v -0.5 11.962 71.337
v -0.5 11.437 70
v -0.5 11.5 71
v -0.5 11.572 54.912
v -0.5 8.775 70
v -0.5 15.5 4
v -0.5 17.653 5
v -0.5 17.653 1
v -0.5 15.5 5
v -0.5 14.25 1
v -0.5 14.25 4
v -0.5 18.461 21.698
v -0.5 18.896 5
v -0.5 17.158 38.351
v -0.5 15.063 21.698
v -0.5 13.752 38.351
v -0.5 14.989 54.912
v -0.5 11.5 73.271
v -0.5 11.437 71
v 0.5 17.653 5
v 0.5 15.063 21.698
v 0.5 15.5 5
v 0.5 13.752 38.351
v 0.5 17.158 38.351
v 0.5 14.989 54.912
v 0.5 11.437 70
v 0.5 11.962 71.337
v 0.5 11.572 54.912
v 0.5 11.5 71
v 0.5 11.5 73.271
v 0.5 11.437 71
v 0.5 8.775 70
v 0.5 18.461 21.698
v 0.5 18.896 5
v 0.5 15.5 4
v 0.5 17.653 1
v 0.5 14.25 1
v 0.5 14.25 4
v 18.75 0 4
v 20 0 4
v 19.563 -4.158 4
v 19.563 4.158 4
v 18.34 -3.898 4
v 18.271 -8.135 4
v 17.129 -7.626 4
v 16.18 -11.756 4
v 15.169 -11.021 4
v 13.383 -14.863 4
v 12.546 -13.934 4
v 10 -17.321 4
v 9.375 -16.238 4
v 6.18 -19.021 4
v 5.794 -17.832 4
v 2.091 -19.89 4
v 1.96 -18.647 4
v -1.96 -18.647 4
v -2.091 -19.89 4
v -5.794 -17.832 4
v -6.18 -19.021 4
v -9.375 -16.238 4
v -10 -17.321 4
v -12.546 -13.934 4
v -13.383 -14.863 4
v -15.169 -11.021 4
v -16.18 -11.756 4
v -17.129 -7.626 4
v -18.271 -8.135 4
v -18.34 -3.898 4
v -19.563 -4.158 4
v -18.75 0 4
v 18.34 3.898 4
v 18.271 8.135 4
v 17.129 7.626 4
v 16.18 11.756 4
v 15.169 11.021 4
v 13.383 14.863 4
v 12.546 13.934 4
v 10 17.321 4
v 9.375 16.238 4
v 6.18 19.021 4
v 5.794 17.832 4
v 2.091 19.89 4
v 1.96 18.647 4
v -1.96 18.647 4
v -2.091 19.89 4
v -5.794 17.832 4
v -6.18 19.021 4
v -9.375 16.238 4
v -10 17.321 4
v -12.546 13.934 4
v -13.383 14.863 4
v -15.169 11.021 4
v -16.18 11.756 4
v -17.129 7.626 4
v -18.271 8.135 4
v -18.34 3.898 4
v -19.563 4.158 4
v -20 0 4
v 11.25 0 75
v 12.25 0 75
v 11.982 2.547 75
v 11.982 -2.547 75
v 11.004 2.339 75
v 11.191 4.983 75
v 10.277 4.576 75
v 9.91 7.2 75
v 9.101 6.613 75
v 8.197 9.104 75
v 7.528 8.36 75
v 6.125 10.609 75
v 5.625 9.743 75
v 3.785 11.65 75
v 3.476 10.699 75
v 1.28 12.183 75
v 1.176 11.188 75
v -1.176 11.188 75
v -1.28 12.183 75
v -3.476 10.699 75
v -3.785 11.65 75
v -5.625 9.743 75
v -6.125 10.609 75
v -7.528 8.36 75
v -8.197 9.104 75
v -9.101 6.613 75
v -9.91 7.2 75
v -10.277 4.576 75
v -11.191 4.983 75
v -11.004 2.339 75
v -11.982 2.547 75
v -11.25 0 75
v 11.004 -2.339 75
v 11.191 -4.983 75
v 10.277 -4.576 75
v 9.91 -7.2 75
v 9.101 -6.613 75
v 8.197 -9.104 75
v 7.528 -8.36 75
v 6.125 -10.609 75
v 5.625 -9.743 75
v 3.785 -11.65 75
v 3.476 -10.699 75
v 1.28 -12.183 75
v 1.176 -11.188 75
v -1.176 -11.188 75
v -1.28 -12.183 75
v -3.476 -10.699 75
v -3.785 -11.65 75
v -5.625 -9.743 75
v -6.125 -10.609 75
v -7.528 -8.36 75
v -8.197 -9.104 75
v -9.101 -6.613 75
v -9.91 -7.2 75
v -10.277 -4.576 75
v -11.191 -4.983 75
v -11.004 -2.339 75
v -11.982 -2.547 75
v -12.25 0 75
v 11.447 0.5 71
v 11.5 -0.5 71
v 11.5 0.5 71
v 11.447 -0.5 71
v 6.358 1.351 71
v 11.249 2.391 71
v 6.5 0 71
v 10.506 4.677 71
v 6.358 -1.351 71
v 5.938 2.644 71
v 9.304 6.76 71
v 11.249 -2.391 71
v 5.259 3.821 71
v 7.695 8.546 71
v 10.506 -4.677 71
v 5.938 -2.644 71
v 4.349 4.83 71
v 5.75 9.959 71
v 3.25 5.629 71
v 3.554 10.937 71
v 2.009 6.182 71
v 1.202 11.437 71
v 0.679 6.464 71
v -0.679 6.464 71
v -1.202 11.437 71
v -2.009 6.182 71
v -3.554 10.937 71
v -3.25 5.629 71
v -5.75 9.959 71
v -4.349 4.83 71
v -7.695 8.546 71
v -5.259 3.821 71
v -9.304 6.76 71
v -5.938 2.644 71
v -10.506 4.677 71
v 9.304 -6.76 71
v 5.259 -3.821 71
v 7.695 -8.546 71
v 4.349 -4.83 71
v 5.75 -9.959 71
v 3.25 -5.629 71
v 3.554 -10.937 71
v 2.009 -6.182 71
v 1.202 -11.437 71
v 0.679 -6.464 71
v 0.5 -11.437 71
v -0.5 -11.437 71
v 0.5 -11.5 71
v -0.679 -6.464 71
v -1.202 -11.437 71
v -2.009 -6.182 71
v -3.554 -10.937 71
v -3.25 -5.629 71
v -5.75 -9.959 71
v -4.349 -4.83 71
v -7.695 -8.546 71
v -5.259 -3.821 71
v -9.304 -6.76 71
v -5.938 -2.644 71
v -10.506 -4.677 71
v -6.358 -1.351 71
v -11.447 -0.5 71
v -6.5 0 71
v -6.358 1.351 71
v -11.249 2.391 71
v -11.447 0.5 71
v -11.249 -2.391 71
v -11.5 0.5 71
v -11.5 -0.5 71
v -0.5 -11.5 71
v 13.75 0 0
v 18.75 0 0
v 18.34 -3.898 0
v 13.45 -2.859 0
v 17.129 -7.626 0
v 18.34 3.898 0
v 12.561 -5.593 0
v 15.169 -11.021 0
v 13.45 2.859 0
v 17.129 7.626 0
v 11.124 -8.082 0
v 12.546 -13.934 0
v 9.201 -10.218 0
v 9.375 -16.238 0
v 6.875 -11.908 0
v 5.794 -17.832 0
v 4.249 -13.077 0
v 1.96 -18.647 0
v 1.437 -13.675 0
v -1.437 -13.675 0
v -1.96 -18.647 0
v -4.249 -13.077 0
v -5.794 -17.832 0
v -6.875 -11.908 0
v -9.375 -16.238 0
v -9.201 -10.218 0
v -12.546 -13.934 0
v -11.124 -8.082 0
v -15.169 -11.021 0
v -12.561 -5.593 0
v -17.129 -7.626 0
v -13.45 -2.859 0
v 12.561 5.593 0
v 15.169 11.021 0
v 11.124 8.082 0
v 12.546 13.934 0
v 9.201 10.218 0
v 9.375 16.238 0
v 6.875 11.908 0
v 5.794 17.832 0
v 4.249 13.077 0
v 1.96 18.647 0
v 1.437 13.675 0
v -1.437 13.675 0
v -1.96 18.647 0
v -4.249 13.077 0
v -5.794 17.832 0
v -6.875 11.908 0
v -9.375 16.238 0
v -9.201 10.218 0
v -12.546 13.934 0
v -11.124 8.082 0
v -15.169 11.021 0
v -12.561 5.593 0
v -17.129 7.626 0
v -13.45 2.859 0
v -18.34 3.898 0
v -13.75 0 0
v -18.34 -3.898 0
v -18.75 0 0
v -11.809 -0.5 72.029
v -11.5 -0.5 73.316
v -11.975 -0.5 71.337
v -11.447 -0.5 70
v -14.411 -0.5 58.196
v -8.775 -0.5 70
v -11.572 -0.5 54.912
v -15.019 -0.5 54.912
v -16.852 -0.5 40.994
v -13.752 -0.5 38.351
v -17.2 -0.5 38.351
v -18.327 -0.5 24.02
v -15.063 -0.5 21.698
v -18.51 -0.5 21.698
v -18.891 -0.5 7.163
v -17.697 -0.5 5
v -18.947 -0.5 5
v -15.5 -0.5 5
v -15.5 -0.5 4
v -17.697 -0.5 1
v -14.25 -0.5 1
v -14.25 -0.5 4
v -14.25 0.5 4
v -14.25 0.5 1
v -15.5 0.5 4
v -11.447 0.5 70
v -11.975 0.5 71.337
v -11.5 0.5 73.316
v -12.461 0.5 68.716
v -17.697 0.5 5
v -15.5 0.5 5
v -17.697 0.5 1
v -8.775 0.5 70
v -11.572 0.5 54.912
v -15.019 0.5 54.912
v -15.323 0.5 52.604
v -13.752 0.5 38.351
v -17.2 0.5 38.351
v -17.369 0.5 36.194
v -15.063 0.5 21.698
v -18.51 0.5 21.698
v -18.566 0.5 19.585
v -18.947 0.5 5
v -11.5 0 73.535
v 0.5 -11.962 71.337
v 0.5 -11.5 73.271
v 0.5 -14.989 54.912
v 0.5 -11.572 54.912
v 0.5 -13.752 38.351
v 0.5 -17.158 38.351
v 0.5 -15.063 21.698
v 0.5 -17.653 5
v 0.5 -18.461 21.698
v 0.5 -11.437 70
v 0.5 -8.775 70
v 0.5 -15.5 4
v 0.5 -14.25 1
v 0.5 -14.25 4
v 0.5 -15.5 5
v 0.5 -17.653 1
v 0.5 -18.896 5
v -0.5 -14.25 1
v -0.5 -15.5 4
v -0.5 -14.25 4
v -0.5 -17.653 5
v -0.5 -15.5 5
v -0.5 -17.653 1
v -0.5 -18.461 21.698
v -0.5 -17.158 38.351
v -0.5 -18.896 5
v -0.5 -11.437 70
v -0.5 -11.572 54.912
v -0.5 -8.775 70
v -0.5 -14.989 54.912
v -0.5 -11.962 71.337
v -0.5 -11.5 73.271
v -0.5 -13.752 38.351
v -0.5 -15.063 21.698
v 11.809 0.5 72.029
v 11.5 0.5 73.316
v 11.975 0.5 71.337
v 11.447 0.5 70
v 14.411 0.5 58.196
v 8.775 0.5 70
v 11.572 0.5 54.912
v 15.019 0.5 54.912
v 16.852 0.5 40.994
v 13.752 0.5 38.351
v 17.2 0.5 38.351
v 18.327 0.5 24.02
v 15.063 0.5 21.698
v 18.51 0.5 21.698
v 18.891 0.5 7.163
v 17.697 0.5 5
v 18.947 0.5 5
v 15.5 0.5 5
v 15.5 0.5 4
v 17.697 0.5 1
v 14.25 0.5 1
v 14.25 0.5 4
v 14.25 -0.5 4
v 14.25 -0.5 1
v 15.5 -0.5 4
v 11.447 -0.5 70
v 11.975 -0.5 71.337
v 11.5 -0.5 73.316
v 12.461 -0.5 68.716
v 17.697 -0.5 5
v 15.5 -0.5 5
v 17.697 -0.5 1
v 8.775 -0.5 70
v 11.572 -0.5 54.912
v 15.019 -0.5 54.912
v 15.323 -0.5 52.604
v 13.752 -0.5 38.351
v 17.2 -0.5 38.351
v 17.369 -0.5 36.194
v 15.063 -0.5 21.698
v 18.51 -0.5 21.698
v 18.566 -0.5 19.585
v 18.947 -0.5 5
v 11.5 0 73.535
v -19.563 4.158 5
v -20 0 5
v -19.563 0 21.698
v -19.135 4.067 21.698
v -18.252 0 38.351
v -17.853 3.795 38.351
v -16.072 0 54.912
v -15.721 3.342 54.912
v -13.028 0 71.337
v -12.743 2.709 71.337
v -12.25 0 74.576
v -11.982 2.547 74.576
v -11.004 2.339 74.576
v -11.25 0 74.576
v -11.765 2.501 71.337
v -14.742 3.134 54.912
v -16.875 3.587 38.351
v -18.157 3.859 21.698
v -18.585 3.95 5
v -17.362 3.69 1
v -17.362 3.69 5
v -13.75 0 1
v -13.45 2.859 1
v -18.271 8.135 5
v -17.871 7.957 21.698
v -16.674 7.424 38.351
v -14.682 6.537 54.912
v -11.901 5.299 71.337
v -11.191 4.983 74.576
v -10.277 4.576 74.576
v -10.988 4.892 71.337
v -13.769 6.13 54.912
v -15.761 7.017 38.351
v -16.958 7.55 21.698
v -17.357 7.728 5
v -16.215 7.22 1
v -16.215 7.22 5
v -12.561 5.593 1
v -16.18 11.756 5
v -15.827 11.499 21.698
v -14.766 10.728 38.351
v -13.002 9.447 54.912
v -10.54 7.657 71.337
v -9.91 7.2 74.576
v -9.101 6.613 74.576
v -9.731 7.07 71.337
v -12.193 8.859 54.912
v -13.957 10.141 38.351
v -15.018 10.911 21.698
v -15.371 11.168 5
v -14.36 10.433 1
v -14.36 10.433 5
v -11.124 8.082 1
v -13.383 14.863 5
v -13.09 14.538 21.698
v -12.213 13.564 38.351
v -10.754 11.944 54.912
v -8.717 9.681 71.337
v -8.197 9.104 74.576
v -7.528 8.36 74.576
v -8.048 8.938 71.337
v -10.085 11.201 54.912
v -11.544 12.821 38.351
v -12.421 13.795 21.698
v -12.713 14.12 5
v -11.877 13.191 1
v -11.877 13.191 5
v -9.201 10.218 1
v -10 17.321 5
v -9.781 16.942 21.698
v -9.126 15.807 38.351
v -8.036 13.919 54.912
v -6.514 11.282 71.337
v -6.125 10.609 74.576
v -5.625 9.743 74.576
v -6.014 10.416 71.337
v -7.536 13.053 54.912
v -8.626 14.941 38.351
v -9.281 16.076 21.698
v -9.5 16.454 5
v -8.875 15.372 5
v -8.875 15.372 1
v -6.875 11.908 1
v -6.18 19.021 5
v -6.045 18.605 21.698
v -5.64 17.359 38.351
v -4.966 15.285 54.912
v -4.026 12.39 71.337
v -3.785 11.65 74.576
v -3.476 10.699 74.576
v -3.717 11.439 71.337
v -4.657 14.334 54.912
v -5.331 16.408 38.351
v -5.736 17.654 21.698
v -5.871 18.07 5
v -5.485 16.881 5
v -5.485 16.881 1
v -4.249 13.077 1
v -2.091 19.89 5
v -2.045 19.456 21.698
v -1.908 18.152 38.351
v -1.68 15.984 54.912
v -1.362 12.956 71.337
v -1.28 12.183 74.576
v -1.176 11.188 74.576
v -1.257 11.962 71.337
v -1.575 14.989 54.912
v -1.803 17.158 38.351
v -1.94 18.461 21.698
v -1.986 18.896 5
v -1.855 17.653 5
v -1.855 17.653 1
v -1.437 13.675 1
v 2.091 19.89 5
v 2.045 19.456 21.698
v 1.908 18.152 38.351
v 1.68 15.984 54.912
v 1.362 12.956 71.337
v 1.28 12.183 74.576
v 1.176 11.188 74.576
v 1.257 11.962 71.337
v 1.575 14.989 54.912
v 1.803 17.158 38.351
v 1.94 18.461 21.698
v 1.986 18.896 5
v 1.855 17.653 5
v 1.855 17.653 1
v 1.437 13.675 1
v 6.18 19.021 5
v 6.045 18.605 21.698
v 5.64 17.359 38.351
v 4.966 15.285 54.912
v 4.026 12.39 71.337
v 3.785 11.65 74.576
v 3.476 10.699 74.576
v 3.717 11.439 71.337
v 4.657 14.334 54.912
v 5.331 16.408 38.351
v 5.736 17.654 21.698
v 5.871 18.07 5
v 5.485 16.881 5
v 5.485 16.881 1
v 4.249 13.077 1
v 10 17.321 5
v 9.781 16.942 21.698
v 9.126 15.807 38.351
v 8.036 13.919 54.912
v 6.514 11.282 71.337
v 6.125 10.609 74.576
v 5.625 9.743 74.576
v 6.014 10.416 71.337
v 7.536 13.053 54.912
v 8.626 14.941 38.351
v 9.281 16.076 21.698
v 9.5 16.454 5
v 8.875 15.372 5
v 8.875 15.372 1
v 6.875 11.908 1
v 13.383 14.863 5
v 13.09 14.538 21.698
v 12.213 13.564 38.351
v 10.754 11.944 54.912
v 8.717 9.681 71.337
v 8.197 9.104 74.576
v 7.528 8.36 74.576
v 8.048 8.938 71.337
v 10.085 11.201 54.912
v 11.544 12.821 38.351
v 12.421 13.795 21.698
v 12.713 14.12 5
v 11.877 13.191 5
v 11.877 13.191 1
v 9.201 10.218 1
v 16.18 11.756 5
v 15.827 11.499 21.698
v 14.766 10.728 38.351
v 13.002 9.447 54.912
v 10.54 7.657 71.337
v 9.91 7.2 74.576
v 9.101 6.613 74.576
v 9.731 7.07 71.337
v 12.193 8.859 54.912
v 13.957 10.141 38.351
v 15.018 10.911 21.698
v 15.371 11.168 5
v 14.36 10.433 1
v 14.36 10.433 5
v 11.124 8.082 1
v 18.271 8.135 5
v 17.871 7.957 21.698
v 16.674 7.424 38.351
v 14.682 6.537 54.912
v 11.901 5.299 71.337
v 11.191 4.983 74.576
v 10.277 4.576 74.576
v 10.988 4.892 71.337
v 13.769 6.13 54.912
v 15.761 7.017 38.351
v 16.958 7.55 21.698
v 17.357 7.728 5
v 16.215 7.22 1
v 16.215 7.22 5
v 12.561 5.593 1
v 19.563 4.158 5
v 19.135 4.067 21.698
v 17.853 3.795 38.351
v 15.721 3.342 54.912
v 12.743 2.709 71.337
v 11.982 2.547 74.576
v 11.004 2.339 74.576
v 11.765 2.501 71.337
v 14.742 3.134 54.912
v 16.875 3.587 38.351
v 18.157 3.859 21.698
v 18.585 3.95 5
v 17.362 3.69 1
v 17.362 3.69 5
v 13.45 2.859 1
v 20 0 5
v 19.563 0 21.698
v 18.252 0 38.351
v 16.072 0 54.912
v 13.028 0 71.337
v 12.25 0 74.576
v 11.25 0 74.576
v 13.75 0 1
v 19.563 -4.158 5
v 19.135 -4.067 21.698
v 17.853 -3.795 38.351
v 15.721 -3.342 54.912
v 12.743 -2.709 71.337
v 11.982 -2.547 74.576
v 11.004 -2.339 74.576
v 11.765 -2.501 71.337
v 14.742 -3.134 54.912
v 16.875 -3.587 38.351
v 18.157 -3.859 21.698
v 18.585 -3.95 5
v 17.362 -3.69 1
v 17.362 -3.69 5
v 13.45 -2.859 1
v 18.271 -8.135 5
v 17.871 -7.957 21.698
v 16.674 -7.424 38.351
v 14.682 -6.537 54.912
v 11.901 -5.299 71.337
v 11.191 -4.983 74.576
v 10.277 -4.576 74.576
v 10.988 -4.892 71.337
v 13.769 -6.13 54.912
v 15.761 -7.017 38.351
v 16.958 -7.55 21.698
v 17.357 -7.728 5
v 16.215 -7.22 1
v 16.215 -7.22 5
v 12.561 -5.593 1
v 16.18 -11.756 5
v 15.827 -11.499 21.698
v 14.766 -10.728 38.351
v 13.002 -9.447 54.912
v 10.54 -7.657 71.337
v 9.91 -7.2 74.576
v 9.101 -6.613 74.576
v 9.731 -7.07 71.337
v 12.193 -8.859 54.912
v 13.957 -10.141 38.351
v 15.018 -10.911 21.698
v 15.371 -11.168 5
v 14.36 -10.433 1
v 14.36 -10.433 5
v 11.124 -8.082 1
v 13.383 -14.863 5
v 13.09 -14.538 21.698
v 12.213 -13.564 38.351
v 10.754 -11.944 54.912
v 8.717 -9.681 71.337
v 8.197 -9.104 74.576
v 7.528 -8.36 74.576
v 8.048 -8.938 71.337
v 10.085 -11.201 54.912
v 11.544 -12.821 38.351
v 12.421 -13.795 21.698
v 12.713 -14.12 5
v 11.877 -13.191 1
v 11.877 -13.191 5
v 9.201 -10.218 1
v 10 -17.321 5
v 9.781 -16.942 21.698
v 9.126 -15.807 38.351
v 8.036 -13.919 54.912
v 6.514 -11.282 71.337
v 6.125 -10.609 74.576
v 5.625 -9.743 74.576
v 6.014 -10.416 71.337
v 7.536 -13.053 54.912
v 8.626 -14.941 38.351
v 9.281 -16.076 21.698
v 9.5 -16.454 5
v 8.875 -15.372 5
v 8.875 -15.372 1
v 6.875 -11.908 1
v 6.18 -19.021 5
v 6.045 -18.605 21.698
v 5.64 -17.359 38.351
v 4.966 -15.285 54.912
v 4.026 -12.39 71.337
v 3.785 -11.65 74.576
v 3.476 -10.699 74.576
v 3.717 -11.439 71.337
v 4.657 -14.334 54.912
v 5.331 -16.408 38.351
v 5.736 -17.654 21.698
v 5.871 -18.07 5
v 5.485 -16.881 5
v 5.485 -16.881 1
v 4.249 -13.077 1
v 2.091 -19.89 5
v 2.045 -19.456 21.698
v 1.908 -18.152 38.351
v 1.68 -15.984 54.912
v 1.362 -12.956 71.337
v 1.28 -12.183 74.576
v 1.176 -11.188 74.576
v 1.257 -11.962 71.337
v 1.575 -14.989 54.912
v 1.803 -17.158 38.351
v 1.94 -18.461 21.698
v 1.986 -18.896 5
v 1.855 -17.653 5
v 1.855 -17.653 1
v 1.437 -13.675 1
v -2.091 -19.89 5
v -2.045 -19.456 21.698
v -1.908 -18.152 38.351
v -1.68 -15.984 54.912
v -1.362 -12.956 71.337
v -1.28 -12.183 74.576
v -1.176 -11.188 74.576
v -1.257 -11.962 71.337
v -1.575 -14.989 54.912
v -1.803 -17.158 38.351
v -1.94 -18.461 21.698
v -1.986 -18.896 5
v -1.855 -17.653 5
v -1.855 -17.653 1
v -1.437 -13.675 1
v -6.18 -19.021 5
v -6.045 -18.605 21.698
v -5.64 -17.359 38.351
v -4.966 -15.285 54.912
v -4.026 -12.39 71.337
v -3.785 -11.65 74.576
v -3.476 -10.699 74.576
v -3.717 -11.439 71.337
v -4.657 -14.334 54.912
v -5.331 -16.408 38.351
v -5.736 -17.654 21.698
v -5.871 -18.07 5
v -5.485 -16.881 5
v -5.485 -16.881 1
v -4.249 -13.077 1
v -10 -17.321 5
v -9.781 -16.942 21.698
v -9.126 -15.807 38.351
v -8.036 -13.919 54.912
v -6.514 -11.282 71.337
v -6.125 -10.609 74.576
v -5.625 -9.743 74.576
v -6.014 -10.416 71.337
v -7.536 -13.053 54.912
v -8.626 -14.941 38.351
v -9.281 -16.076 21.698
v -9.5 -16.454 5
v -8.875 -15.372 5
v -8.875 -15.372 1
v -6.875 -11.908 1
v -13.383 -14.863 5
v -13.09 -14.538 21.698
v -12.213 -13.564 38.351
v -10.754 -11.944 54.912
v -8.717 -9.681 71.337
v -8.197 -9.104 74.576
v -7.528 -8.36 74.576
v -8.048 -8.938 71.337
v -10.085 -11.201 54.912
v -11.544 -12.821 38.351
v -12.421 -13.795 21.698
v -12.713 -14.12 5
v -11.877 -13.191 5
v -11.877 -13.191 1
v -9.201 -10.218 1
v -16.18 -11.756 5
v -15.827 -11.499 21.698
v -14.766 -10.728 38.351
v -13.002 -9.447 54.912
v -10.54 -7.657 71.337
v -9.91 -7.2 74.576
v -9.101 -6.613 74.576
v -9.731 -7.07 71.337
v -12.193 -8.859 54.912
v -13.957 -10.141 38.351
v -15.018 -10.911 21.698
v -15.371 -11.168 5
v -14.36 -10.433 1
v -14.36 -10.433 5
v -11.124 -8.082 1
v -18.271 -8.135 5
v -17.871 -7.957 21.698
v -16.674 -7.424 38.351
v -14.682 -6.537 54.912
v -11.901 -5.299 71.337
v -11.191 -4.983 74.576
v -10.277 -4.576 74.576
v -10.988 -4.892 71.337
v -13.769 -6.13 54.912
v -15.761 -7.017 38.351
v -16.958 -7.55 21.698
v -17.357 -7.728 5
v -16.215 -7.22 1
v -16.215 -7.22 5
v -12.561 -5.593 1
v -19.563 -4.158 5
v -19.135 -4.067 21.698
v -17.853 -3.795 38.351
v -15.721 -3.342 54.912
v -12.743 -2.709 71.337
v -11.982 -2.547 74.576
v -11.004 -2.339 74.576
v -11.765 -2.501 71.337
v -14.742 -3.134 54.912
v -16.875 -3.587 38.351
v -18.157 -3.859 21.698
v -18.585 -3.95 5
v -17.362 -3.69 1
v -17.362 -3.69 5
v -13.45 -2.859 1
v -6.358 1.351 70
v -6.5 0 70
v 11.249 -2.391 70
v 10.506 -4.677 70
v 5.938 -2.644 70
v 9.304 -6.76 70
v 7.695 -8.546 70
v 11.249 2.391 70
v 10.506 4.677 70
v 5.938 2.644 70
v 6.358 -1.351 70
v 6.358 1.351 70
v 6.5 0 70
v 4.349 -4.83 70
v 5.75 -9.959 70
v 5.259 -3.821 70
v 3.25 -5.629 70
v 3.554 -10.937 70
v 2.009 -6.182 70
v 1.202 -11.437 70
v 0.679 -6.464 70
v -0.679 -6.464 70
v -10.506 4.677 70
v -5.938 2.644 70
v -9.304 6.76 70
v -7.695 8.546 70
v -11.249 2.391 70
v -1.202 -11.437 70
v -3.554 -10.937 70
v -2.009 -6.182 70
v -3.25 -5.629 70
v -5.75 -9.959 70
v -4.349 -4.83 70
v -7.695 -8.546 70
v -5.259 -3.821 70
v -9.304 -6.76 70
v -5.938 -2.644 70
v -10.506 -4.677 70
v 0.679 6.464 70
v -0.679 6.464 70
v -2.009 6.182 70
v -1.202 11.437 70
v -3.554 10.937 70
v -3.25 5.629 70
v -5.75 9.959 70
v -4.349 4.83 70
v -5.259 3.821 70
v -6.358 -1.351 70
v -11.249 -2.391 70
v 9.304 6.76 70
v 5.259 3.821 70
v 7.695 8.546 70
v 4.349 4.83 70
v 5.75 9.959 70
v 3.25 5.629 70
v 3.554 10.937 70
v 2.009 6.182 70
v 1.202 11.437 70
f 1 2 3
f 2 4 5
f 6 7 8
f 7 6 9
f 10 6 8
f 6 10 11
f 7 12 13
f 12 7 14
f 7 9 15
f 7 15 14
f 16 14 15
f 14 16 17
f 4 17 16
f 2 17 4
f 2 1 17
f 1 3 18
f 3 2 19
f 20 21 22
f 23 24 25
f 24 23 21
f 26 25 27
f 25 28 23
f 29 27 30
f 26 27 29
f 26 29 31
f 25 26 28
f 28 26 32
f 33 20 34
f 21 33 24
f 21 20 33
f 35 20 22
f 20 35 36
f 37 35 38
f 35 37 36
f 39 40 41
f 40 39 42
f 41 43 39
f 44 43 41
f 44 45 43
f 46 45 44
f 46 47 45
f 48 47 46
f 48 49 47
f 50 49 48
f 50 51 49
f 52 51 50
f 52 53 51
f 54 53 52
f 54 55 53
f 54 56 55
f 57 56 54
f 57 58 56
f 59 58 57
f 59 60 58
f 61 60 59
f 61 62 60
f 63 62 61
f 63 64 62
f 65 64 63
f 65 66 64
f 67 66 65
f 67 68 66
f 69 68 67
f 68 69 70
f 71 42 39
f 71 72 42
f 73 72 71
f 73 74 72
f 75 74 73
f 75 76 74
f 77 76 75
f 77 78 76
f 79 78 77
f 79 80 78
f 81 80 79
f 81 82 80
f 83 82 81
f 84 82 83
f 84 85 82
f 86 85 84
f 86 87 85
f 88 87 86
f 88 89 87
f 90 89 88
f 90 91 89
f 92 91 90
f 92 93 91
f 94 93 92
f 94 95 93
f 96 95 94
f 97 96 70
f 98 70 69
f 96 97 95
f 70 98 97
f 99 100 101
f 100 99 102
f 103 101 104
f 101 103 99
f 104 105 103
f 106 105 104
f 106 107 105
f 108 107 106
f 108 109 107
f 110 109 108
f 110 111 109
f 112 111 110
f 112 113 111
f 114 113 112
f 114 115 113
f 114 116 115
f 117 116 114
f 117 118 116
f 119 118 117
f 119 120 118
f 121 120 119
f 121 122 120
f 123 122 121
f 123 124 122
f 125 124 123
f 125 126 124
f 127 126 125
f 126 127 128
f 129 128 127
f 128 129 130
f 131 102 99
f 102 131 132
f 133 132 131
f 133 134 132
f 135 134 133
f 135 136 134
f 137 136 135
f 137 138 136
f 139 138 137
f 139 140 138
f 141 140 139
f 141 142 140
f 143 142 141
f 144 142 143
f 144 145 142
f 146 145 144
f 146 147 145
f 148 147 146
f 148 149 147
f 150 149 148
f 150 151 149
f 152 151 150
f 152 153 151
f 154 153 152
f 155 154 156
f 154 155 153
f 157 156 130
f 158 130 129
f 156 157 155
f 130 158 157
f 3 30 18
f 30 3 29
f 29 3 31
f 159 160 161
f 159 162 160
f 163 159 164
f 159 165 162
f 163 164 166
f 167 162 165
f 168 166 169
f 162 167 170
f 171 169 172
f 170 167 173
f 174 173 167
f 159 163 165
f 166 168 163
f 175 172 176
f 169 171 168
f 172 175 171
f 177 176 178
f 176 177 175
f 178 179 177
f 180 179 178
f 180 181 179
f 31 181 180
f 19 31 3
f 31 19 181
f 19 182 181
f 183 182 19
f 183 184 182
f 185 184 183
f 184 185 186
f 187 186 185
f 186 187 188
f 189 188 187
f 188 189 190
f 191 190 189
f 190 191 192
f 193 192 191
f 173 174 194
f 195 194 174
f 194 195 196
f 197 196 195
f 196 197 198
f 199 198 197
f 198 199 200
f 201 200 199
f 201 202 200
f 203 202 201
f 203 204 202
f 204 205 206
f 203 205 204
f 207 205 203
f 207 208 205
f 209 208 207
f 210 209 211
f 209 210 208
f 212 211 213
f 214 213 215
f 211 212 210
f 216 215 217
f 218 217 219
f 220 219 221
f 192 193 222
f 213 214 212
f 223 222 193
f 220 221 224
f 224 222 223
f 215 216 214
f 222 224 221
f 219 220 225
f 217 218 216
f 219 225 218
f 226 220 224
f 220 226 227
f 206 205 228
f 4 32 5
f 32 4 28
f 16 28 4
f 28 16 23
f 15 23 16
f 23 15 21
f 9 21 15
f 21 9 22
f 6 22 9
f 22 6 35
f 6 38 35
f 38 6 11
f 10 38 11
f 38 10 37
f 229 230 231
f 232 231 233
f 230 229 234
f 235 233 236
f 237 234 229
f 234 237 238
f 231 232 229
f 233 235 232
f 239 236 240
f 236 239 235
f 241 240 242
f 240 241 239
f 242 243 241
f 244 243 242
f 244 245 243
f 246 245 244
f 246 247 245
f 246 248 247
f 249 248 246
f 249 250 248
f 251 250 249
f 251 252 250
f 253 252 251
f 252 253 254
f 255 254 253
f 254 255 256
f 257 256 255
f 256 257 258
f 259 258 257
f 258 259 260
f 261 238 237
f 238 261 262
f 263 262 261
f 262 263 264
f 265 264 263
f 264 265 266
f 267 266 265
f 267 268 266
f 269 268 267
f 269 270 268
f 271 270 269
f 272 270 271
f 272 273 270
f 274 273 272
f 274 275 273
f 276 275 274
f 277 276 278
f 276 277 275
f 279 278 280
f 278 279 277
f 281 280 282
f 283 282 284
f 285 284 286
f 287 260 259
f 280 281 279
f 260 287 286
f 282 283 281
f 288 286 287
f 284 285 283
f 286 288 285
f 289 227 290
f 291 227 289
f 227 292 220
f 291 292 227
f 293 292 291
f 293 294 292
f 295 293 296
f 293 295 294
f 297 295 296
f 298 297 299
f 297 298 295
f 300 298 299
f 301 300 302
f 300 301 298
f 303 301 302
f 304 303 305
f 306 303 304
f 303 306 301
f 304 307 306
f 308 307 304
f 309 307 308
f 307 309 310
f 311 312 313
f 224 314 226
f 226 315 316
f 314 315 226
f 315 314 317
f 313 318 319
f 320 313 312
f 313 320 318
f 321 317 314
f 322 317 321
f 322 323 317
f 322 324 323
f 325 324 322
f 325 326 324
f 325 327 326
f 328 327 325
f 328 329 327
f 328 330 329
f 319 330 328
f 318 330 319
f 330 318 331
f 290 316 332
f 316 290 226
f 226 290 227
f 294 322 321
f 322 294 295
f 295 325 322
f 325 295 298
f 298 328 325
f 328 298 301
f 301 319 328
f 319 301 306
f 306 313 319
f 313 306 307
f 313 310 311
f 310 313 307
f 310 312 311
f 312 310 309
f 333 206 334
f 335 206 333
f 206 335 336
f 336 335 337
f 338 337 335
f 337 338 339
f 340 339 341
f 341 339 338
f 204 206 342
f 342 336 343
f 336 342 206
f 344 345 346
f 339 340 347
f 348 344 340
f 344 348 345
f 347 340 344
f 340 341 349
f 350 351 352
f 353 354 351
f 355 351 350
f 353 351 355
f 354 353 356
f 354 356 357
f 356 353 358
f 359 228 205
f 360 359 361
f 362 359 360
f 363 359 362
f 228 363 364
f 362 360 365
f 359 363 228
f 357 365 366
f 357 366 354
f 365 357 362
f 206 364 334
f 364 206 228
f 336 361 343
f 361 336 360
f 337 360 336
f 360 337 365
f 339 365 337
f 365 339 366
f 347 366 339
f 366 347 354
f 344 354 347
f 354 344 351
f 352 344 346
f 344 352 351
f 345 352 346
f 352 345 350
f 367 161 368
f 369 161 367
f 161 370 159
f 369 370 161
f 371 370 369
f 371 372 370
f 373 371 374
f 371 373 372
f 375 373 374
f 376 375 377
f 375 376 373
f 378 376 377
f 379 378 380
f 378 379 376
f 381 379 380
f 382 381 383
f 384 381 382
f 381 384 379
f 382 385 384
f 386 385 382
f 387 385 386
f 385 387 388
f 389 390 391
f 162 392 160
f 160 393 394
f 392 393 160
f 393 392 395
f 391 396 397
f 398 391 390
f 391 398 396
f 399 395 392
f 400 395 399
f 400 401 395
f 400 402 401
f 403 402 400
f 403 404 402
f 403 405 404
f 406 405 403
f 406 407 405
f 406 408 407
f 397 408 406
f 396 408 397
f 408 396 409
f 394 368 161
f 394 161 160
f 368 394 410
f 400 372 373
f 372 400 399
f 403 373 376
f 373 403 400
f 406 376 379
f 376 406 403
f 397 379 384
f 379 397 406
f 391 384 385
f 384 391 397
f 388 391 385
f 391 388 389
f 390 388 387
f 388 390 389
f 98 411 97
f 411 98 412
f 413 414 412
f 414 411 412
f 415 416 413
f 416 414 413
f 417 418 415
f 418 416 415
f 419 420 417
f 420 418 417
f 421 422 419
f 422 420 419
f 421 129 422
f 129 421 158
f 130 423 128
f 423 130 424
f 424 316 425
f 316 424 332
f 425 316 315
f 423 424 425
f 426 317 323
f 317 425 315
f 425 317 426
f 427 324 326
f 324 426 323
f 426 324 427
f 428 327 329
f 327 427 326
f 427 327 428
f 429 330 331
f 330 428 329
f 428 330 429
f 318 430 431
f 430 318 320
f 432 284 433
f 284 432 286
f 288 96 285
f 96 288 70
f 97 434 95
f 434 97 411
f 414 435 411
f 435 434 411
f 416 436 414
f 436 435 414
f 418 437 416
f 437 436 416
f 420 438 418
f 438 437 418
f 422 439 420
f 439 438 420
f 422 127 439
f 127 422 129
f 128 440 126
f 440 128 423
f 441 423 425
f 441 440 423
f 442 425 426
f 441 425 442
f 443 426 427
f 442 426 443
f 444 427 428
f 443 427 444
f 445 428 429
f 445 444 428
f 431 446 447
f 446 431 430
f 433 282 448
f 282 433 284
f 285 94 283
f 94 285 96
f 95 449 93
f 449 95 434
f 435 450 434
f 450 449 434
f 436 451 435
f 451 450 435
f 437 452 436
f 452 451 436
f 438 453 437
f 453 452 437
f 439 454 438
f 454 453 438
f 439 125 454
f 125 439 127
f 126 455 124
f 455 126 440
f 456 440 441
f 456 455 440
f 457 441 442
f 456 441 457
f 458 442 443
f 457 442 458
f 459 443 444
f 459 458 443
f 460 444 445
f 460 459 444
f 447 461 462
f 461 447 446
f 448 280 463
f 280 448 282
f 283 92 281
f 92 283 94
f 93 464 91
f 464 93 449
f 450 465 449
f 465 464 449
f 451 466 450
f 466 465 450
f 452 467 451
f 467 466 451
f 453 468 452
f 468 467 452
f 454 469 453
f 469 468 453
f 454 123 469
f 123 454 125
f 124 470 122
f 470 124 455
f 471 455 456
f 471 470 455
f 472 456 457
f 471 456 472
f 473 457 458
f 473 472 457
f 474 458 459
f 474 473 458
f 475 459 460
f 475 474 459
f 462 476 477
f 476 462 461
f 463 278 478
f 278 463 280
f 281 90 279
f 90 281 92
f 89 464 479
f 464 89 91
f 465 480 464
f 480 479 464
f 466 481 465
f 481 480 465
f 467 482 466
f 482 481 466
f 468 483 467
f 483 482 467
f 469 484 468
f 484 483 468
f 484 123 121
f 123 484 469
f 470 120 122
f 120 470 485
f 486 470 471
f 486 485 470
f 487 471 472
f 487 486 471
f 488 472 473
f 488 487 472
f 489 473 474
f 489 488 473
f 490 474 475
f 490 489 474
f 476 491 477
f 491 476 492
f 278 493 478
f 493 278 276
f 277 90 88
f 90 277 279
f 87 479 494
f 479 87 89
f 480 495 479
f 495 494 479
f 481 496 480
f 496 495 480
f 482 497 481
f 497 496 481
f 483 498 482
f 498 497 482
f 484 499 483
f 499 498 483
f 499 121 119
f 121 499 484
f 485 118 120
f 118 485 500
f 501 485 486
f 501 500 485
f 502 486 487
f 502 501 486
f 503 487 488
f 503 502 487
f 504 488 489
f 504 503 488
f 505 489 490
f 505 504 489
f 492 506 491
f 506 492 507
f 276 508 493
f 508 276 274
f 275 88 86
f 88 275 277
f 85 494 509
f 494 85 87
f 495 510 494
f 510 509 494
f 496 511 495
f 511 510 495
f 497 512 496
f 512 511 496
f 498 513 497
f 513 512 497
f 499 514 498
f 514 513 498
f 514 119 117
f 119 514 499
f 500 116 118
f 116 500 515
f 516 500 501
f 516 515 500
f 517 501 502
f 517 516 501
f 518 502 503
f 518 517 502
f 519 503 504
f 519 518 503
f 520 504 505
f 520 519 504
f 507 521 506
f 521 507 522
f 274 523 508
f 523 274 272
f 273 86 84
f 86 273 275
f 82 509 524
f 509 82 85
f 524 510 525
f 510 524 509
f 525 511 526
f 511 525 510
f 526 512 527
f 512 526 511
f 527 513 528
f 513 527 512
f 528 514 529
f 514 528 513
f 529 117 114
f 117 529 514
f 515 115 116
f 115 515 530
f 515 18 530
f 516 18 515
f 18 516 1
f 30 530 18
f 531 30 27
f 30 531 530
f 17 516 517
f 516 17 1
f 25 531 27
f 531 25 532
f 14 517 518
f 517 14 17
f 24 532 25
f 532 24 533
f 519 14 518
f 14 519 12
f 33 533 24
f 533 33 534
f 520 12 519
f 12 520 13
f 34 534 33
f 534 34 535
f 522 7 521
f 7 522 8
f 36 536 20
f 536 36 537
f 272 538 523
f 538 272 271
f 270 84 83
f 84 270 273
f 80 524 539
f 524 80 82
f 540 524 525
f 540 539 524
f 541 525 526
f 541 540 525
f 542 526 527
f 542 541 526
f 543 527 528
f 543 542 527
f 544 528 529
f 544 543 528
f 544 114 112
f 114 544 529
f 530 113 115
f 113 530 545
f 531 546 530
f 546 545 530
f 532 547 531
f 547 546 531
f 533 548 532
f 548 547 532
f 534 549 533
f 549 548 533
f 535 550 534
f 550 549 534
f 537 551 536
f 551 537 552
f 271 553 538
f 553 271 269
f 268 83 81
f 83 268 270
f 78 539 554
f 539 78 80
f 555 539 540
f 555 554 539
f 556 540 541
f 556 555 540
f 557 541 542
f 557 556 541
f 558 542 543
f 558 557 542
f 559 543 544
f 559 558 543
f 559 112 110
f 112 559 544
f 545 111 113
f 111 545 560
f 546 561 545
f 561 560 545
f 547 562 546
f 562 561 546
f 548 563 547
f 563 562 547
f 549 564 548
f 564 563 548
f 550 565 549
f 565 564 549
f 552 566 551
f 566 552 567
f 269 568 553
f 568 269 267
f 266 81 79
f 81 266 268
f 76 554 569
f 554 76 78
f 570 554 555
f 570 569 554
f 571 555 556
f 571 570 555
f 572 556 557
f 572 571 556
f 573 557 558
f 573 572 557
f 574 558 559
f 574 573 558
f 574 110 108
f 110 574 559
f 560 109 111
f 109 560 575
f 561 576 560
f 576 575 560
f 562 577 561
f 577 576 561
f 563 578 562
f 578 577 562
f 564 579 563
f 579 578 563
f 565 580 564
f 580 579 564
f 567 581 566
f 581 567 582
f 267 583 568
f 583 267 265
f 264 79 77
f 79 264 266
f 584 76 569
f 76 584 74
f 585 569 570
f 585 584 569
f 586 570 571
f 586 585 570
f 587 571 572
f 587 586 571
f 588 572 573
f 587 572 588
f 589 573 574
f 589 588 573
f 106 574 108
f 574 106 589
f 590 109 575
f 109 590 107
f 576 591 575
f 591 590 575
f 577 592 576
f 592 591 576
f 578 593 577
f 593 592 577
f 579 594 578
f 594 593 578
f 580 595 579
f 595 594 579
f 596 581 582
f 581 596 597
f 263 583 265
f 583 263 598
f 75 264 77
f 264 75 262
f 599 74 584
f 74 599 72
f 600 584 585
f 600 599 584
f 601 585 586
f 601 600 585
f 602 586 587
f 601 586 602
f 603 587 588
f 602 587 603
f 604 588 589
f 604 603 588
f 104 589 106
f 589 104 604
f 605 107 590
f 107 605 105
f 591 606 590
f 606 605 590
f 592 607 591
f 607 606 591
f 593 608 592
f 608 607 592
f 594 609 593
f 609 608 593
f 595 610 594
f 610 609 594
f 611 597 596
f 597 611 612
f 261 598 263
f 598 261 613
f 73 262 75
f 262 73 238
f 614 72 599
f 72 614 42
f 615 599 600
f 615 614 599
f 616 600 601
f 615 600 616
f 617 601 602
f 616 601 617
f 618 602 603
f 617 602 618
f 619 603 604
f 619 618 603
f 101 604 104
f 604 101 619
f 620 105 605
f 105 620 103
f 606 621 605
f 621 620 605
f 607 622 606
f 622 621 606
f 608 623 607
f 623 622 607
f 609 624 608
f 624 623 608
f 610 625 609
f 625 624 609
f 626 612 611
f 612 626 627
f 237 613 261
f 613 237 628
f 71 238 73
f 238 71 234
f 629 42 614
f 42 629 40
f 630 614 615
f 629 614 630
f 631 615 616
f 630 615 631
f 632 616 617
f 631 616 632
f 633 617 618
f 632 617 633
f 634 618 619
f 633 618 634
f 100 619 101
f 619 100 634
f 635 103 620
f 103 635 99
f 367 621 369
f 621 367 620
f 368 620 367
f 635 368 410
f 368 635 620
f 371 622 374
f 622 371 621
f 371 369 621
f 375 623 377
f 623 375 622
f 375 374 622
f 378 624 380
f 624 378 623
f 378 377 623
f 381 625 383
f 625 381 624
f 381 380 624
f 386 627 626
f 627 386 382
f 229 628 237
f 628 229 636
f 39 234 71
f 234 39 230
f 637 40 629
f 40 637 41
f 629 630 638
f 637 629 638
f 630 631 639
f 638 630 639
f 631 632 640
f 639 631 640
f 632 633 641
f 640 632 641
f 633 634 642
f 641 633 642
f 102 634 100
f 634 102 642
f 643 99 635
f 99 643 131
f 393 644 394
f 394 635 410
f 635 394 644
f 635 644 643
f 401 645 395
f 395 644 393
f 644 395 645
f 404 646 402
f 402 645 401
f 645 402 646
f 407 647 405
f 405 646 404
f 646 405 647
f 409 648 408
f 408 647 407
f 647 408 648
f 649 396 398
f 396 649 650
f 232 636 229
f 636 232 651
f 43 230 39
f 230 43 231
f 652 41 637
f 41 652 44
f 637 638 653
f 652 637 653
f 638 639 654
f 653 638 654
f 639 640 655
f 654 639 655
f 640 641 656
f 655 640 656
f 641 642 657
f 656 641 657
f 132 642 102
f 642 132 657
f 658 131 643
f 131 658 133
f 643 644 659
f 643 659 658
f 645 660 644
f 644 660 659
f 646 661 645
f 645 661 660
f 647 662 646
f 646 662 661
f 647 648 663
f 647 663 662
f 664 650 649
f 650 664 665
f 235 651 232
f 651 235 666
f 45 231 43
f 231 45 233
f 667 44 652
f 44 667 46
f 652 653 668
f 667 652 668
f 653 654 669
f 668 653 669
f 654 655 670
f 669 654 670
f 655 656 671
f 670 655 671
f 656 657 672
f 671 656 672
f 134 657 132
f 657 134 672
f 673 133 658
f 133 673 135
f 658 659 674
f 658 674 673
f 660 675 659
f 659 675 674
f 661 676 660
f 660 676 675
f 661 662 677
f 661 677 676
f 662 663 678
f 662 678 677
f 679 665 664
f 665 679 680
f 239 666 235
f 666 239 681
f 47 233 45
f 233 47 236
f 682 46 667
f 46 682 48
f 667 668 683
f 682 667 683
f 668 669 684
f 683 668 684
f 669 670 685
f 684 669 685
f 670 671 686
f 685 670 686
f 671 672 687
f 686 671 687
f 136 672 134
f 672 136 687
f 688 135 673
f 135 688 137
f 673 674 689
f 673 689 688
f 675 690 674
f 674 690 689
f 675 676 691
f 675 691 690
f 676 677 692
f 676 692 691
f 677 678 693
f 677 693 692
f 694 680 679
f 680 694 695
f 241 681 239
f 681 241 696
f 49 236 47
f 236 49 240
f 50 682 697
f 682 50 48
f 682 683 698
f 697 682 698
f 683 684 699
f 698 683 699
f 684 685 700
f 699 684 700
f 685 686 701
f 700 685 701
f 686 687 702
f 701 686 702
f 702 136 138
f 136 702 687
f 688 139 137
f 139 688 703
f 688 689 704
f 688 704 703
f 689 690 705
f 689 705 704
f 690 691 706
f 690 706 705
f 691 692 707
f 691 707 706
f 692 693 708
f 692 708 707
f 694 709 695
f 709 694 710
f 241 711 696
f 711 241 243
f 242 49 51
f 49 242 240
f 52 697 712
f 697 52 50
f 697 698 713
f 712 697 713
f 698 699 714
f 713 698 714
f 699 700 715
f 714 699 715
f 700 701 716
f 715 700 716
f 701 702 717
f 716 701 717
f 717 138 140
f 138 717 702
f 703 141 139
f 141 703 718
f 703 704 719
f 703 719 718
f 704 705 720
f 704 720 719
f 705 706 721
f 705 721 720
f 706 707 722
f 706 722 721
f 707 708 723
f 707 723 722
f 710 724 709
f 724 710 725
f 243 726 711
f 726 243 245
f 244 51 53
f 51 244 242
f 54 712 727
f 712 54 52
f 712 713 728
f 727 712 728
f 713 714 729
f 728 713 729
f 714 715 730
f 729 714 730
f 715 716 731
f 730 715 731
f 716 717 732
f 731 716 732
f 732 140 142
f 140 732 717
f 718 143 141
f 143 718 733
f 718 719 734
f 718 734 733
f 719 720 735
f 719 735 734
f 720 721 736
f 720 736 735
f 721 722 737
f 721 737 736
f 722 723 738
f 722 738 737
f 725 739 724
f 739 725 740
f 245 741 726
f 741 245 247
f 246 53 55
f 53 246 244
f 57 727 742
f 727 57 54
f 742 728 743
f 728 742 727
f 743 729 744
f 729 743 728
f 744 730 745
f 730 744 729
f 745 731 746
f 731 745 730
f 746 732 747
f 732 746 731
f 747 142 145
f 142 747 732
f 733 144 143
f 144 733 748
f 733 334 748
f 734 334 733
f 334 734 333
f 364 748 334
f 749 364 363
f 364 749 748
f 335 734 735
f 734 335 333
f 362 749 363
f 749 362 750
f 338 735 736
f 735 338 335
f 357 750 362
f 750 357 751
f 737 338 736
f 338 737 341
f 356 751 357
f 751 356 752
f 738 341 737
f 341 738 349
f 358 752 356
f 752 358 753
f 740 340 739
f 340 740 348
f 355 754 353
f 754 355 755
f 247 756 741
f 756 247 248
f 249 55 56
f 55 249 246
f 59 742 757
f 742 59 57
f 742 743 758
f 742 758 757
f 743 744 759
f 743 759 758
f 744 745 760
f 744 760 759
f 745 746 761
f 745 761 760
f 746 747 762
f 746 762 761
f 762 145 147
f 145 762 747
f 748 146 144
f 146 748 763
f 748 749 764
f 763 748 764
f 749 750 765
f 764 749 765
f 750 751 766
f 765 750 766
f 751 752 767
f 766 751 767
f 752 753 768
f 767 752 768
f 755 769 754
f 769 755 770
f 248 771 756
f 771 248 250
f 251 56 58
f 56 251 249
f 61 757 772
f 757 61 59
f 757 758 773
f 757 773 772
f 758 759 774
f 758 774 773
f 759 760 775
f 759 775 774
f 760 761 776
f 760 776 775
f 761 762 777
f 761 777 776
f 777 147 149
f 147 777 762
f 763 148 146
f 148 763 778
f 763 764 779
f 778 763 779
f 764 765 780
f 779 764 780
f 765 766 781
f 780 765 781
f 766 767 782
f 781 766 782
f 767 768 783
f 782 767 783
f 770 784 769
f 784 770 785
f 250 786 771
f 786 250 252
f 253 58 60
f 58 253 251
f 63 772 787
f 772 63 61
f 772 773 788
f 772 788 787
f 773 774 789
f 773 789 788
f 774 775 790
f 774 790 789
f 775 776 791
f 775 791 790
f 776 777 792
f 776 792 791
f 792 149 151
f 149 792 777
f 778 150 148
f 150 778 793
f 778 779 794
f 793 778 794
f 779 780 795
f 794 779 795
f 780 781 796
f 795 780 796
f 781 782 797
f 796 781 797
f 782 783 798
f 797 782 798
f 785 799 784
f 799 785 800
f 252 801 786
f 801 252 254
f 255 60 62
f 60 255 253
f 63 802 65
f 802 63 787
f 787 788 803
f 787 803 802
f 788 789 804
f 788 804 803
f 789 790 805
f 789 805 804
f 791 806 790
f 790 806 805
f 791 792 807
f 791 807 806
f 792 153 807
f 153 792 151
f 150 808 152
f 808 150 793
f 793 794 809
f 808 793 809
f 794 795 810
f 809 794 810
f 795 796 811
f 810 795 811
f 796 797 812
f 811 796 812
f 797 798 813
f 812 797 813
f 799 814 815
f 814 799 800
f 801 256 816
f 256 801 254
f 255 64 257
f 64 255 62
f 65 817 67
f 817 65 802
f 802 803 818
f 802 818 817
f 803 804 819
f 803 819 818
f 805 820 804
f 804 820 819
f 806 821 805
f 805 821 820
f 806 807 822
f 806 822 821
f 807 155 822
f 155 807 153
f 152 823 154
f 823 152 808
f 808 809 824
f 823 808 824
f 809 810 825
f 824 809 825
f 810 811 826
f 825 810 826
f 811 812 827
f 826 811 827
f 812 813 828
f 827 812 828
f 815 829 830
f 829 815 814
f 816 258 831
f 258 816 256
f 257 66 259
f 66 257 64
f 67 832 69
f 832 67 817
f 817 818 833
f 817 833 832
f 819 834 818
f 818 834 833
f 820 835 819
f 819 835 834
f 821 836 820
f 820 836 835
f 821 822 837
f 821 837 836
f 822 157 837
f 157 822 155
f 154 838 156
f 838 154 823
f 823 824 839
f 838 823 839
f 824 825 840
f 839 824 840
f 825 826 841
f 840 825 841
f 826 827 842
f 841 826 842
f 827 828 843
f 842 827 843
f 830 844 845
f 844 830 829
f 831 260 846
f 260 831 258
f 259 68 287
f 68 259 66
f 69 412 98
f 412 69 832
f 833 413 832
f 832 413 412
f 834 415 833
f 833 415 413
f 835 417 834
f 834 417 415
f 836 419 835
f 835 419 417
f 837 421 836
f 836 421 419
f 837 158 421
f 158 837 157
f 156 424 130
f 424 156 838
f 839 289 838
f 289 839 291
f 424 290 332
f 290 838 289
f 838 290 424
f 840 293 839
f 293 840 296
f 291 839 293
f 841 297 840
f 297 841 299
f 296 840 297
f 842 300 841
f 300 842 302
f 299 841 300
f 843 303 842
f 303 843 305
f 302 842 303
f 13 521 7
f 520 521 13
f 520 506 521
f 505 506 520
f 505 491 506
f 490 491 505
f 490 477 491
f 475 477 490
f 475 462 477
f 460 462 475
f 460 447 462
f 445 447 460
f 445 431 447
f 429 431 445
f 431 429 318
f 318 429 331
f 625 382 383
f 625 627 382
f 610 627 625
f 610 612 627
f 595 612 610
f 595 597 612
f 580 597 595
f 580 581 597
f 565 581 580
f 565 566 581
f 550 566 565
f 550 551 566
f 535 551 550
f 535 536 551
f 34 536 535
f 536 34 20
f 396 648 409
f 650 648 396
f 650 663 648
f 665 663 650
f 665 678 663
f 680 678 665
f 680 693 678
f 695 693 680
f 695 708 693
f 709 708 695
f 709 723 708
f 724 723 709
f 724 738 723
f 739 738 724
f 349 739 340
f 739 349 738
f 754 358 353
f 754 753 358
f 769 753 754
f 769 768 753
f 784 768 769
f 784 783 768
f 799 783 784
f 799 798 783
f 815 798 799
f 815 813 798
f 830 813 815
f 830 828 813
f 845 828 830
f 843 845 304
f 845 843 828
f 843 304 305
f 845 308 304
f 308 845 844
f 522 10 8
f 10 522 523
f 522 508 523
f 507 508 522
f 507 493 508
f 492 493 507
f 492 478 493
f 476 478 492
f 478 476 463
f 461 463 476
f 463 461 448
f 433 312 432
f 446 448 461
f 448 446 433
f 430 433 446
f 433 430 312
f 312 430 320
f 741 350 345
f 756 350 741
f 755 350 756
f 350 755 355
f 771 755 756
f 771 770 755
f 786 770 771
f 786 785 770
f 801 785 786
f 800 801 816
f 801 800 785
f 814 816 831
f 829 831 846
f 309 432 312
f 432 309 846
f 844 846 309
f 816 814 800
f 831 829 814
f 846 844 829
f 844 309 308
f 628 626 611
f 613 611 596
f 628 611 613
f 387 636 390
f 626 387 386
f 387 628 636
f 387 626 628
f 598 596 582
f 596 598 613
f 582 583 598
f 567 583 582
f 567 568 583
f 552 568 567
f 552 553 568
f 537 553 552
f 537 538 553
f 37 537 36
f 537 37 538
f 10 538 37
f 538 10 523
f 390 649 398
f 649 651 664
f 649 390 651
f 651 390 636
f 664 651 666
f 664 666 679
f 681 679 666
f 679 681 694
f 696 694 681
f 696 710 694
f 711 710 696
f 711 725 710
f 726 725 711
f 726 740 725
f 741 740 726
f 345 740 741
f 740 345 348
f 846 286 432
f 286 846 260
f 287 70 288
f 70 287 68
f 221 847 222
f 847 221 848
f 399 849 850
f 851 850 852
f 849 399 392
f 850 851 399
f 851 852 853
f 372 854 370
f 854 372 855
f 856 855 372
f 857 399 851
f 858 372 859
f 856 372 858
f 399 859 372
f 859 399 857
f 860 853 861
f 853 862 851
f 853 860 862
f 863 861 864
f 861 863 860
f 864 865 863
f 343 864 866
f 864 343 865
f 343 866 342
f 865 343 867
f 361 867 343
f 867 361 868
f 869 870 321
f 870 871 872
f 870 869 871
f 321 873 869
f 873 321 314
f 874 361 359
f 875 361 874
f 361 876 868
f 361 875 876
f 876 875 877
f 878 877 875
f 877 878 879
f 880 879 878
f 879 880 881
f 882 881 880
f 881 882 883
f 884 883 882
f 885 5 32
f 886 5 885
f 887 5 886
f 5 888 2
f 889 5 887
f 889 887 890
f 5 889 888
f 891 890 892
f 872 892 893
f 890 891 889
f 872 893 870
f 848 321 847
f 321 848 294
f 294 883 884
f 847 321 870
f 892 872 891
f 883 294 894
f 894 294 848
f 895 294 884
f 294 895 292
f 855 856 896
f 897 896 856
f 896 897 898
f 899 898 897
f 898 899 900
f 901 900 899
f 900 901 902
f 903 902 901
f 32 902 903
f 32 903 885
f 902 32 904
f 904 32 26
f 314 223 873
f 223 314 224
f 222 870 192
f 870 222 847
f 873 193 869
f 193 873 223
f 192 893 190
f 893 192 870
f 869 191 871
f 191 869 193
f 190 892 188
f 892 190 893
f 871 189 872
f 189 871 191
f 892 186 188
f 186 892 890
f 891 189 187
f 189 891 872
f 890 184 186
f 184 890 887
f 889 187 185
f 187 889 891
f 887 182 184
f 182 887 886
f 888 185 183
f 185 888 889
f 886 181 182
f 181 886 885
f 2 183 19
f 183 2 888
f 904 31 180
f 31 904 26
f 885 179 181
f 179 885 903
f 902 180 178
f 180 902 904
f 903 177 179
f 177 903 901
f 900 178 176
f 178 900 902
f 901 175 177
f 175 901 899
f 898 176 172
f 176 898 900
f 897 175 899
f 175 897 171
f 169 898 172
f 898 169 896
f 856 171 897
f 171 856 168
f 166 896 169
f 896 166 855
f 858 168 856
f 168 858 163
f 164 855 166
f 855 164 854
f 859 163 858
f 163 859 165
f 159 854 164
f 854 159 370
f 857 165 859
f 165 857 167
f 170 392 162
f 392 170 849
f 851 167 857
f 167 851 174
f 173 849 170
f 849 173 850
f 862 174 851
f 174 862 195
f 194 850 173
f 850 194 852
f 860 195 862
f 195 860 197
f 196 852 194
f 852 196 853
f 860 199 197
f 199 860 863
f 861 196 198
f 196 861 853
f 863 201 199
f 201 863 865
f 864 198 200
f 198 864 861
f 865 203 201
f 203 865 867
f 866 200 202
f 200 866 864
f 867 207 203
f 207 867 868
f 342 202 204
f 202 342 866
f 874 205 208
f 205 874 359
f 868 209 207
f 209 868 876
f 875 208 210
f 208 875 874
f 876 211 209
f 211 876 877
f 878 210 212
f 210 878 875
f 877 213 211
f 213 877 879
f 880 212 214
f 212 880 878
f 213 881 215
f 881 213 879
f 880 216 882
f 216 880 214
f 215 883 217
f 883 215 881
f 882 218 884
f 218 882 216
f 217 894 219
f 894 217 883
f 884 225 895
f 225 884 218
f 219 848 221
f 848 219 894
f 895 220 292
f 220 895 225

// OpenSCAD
//Radius of the bottom of the section
base_radius=20; //[6:55]

//Radius of the top of the section
tip_radius=12;//[0:55]

//It may not work correctly with same diameter ends, ex 15,15, use 15.1,15 or similar

//Length of the rocket section
length = 75;//

//Width of the mounting flanges and braces
mounting_lip_width = 4; //[4:6]

//Thickness of the skin
skin_thickness=1; //[1:4]

//Number of internal bracing ribs
quantity_of_internal_braces = 4;//[2:12]
//
//
//

edge = mounting_lip_width+skin_thickness;
s = base_radius-tip_radius;
sa= tip_radius-base_radius;
//
l = length-mounting_lip_width;
//
a1=s*s;
a1a=sa*sa;

a2=l*l;

a3=2*s;
a3a=2*sa;

a4=a1+a2;
a4a=a1a+a2;

taperrad = a4 / a3;
taperrada= a4a/a3a;

////

for (i=[1:quantity_of_internal_braces]) {rotate([0,0,i*360/quantity_of_internal_braces]){brace();}}

module blockout(){
translate([-5000,-2500]){square([5000,5000]);}}



//blockout();

module bracetopblock(){
    translate([tip_radius-mounting_lip_width,length-mounting_lip_width]){
        square([mounting_lip_width,mounting_lip_width]);}
    }
//bracetopblock();
    
module fe_endsolid(){
    translate([0,length-mounting_lip_width]){
        square([tip_radius+.25,mounting_lip_width]);
        };
    }
//fe_endsolid();

    
module fe_basesolid(){
        translate([0,mounting_lip_width]){
            square([base_radius,skin_thickness]);}
        square([base_radius-skin_thickness-.25,mounting_lip_width]);
        }
    
    
//fe_basesolid();

    
module ccvconesolid(){
    difference(){translate([0,edge]){square([tip_radius,length-edge]);}
        mirror([0,1])
    difference(){
        translate([taperrada+base_radius,-edge]){
            circle(r=taperrada,$fn=120);
            }
        translate([base_radius-edge,-edge]){
            square([taperrada*3,taperrada*3]);
            }
        translate([tip_radius,-taperrada-length]){
            square([taperrada*2,length*5]);
            }
        };
        }
    }
            
       
    
//ccvconesolid();

    
module cvxconesolid(){
            difference(){
                translate([-taperrad+base_radius,edge]){circle(r=taperrad,$fn=120);};
                translate ([-2500,length]){square([5000,5000]);};
                translate ([-2500,-5000+mounting_lip_width]){square([5000,5000]);};
                translate ([-5000,-taperrad*2+mounting_lip_width]){square([5000,5000]);};
            }
        };
    
//cvxconesolid();

            
module skin_profilesolid(){union(){
            fe_basesolid();
            fe_endsolid();
            if (base_radius>tip_radius)cvxconesolid(); else if(base_radius<tip_radius) ccvconesolid();}
        
  }  
//skin_profilesolid();
  
module bsil(){difference(){
        skin_profilesolid();
        skin_profilehollow(-mounting_lip_width);
            }
            
        }

//bsil();
       
module brace(){rotate([90,0,0]){
    translate([-skin_thickness/2,0,-skin_thickness/2]){linear_extrude(height=1){flatbrace();};}
    }
    }

//brace();
    
module flatbrace(){
    difference(){
        rawflatbrace();
        translate([skin_thickness,0]){
            blockout();
            }
        }
    }
//flatbrace();
    
module rawflatbrace(){
difference(){
    difference(){bsil();
          translate([-mounting_lip_width,0]){bsil();}}
         bracetopblock(); }}
//rawflatbrace();
  
module skin_profilehollow(thick){
        translate([thick,0]){
            skin_profilesolid();
            }
        }
//skin_profilehollow(-skin_thickness);

module rawskin_profile(){
    top_flange();
    bottom_flange();
    fixerflange();
    difference(){
        skin_profilesolid();
        skin_profilehollow(-skin_thickness);}
        
            
        }
        


//rawskin_profile();
        
module skin_profile(){
    difference(){
        rawskin_profile();
        blockout();}}
//skin_profile(); 

module flange(){
    square([edge,skin_thickness]);
    }     
//flange();
    
module fixerflange(){
    translate([base_radius-skin_thickness*2-.25,mounting_lip_width]){square([skin_thickness+.25,skin_thickness]);}
    }
         
//fixerflange();
    
module top_flange(){
    translate([tip_radius-skin_thickness*1.5-mounting_lip_width,length-mounting_lip_width-skin_thickness]){flange();}
}
//top_flange(); 

module bottom_flange(){
    translate([base_radius-edge-skin_thickness-.25,0]){flange();}
}
//bottom_flange(); 

module nc_skin3d(){
    rotate_extrude()skin_profile();
    }
//nc_skin3d();
    
module fuse_part(){
    nc_skin3d();
    brace();
    }
fuse_part();

module rocketpart(){
translate([40,0,0]){
    fuse_part();
    translate([0,0,length-mounting_lip_width]){
        fuse_part();
        }
    }
}
   
//rocketpart();

